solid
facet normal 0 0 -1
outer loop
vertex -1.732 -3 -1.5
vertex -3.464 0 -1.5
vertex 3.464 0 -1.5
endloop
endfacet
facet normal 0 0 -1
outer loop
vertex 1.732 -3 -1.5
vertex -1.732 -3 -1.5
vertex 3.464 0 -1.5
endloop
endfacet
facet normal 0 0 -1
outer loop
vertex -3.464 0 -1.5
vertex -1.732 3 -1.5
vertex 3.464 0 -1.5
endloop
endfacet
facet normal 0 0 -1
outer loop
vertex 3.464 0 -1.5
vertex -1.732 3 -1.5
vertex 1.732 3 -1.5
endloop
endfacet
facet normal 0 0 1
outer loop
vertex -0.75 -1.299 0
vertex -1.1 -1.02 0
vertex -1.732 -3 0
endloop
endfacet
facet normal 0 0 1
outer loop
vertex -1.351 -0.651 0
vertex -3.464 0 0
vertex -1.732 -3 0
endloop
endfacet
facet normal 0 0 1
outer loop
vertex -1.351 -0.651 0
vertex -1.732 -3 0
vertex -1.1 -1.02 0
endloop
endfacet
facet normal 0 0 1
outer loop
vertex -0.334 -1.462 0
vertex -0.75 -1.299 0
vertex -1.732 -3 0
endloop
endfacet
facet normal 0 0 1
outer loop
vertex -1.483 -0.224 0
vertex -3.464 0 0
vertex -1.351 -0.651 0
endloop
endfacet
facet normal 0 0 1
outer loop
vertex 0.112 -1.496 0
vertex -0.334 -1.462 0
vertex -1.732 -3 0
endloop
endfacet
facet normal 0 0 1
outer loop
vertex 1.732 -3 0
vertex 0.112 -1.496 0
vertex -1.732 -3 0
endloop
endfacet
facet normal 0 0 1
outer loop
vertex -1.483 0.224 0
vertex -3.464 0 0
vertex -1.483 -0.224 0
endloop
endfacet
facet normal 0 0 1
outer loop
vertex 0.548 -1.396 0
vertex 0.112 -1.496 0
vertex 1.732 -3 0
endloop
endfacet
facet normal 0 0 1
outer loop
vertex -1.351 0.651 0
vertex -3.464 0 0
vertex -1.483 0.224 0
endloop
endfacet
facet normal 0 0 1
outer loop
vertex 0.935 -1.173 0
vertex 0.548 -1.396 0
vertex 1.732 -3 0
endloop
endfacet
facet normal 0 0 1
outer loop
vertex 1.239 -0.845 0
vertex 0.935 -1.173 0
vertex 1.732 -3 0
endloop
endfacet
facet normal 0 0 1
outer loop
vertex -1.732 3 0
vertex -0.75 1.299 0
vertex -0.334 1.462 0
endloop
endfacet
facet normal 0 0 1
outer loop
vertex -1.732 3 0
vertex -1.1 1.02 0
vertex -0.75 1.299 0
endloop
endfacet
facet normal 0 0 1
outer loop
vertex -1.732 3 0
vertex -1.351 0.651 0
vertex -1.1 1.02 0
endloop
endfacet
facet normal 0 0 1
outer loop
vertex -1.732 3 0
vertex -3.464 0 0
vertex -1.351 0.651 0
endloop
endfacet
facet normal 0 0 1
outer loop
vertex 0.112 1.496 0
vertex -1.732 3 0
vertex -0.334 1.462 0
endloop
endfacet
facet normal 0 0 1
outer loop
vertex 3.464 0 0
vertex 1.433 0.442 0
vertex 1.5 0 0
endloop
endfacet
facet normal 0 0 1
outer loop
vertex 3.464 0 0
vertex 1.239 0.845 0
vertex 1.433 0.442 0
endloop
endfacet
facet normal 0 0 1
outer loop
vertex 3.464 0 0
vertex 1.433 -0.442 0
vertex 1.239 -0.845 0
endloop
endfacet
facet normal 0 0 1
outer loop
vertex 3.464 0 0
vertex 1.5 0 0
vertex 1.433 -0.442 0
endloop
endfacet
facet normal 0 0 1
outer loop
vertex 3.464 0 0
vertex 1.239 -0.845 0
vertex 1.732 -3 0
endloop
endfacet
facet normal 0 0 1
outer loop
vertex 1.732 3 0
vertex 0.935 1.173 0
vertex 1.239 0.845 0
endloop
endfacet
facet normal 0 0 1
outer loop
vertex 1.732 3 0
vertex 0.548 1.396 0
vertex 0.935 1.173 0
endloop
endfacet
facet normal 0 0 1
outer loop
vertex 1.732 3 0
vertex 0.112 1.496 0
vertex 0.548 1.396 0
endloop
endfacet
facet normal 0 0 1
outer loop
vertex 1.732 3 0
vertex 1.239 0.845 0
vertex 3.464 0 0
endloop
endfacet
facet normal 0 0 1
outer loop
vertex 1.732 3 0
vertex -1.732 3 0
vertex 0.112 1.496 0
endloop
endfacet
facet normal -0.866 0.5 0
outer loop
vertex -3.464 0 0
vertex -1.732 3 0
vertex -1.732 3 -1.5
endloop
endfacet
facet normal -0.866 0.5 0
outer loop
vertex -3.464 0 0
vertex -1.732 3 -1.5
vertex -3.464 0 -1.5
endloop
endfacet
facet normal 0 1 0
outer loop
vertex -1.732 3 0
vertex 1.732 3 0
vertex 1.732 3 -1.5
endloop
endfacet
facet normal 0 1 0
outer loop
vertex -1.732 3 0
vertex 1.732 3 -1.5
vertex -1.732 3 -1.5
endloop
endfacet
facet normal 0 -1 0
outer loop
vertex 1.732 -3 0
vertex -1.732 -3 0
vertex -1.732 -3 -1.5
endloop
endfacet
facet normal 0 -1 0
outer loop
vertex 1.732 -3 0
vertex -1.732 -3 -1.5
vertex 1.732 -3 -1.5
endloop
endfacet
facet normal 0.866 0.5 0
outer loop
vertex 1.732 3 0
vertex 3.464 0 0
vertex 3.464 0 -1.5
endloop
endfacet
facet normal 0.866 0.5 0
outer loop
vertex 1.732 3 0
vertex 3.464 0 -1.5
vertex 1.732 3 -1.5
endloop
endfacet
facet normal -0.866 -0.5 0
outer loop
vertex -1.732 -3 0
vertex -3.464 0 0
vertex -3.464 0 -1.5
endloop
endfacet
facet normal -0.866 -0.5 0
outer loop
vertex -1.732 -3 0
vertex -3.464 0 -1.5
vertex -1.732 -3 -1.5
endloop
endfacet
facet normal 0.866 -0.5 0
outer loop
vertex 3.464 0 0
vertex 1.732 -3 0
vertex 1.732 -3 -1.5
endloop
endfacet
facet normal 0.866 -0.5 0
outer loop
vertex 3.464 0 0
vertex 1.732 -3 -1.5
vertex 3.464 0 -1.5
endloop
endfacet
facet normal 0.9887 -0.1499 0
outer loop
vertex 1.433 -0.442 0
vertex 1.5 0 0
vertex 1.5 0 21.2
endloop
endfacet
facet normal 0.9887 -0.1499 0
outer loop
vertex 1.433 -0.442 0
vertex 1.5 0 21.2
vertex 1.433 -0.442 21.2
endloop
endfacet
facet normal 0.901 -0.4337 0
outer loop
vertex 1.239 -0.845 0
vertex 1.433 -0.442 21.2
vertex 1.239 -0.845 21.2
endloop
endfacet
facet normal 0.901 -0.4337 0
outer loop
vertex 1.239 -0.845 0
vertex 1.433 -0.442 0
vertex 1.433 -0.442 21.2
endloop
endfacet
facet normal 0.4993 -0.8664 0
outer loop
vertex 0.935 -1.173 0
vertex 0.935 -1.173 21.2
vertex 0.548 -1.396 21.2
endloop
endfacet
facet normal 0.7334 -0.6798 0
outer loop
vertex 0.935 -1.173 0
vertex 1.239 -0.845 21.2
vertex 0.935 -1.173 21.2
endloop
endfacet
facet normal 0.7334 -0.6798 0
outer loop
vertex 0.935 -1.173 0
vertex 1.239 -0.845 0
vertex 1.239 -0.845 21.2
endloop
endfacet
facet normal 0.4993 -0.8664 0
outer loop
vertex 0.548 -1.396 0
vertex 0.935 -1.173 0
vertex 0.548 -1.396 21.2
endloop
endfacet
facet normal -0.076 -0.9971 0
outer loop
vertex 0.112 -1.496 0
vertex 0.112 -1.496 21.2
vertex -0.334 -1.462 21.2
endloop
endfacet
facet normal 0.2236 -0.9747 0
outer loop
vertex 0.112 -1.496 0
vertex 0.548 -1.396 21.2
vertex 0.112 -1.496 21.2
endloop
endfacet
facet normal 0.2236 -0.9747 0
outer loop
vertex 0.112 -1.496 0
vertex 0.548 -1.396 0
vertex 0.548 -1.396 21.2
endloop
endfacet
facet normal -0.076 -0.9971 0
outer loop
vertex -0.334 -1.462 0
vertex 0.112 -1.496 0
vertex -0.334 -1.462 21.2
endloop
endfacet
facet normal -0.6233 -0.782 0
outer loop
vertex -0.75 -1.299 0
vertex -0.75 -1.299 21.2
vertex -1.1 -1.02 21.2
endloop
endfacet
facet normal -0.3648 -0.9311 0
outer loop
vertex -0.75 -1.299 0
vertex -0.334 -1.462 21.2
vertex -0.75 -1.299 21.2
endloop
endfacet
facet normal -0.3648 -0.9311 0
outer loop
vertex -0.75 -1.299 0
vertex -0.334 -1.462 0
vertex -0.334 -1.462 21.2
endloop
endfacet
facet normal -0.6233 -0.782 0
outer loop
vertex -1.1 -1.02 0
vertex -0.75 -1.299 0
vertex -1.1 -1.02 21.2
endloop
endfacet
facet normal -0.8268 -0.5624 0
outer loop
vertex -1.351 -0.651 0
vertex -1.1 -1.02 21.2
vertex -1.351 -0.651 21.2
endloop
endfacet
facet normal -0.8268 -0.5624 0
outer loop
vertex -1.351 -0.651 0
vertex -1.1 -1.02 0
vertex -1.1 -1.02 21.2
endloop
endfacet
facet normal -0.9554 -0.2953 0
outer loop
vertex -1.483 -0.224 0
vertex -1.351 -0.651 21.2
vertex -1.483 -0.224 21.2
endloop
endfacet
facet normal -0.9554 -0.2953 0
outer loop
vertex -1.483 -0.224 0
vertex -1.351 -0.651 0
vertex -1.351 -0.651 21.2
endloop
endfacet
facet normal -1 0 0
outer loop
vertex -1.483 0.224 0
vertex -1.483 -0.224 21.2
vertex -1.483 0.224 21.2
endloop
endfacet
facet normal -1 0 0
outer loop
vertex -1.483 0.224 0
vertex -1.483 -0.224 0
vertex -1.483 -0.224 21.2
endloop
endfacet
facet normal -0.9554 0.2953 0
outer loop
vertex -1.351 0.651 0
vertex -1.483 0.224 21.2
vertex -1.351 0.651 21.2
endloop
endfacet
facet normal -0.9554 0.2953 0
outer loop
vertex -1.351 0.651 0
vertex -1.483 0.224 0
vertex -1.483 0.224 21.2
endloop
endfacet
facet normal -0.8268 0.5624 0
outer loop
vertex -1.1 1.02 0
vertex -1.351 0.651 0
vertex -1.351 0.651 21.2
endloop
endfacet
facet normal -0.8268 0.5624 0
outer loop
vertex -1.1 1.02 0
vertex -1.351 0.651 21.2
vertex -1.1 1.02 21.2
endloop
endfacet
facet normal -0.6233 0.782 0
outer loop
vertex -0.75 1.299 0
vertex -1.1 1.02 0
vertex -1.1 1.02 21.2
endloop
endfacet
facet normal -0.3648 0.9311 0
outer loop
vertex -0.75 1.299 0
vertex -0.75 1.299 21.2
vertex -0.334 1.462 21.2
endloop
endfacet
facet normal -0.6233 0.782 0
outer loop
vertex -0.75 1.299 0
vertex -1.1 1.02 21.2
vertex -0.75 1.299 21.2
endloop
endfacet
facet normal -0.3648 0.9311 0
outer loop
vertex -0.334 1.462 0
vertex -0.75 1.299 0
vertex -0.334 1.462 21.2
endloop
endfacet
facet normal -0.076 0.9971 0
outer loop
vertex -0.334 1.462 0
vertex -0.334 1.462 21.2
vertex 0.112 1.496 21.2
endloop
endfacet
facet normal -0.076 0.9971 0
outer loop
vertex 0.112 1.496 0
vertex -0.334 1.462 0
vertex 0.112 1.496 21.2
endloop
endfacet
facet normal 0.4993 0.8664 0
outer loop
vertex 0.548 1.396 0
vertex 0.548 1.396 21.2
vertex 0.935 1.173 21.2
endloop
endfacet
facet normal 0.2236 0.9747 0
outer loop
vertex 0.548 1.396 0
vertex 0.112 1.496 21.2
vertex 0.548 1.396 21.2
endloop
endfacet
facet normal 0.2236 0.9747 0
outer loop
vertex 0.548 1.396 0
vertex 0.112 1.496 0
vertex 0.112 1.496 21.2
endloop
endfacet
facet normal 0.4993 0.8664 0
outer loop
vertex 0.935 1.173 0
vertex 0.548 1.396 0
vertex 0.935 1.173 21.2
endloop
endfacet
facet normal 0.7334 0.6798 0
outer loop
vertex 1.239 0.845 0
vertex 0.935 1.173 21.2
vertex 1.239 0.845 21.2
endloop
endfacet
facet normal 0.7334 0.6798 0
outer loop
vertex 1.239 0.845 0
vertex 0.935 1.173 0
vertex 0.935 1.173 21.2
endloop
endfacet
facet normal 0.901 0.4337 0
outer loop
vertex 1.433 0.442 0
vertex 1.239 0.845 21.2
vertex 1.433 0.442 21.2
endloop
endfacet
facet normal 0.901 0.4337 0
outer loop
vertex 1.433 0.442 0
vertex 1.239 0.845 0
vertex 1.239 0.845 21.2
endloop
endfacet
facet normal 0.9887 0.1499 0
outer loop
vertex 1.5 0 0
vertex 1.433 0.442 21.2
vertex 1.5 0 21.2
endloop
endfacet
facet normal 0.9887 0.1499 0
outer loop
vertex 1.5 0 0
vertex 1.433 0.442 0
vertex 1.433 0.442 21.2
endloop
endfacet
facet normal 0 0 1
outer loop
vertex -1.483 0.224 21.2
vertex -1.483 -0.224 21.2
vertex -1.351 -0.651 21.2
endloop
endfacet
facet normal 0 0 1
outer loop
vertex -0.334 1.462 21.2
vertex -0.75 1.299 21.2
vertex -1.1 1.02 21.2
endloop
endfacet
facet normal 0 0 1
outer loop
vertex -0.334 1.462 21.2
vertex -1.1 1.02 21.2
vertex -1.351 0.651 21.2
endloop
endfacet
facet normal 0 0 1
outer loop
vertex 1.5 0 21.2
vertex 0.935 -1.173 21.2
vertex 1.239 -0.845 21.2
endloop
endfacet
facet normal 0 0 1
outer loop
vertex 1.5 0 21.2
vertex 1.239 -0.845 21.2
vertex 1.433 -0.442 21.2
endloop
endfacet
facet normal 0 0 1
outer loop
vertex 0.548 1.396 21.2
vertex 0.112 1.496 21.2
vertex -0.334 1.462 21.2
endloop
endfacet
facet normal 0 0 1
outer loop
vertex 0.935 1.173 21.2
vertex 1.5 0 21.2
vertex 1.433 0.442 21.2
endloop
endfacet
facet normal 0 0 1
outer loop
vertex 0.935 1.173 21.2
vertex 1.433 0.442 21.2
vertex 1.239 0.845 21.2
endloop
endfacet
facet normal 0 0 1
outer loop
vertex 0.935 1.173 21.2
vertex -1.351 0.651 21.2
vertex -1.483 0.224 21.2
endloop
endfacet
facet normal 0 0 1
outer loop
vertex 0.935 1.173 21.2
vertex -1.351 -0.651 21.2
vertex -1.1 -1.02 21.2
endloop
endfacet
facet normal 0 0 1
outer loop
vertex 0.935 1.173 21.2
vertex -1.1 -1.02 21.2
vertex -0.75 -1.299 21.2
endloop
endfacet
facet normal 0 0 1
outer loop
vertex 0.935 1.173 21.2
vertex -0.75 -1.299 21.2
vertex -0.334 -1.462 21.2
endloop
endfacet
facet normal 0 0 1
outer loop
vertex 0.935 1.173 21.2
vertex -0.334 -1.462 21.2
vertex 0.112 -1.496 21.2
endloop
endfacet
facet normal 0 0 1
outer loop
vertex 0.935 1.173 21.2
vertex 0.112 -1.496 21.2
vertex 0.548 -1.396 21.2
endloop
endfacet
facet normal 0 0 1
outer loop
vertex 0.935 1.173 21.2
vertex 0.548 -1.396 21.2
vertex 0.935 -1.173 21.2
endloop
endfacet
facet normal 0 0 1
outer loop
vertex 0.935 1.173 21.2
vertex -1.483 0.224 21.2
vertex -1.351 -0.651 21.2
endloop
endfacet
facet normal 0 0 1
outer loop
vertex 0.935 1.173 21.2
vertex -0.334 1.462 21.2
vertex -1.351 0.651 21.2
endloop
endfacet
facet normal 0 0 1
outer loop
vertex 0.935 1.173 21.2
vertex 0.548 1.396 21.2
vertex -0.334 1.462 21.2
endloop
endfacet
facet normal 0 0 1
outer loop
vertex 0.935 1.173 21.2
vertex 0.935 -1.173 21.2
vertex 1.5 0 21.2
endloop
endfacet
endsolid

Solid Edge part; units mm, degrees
sketch "Sketch1" plane through (0, 0, 0) normal (0, 0, 1) x (1, 0, 0)
  line L0 (-1.7321, -3) -> (1.7321, -3)
  line L1 (1.7321, -3) -> (3.4641, 0)
  line L2 (3.4641, 0) -> (1.7321, 3)
  line L3 (1.7321, 3) -> (-1.7321, 3)
  line L4 (-1.7321, 3) -> (-3.4641, 0)
  line L5 (-3.4641, 0) -> (-1.7321, -3)
extrude "Protrusion1" add sketch "Sketch1" against normal blind 1.5
sketch "Sketch2" plane through (0, 0, 0) normal (0, 0, 1) x (1, 0, 0)
  circle A0 centre (0, 0) radius 1.5
extrude "ExtrudedProtrusion_2" add sketch "Sketch2" along normal blind 21.2
properties material "Stainless steel"
